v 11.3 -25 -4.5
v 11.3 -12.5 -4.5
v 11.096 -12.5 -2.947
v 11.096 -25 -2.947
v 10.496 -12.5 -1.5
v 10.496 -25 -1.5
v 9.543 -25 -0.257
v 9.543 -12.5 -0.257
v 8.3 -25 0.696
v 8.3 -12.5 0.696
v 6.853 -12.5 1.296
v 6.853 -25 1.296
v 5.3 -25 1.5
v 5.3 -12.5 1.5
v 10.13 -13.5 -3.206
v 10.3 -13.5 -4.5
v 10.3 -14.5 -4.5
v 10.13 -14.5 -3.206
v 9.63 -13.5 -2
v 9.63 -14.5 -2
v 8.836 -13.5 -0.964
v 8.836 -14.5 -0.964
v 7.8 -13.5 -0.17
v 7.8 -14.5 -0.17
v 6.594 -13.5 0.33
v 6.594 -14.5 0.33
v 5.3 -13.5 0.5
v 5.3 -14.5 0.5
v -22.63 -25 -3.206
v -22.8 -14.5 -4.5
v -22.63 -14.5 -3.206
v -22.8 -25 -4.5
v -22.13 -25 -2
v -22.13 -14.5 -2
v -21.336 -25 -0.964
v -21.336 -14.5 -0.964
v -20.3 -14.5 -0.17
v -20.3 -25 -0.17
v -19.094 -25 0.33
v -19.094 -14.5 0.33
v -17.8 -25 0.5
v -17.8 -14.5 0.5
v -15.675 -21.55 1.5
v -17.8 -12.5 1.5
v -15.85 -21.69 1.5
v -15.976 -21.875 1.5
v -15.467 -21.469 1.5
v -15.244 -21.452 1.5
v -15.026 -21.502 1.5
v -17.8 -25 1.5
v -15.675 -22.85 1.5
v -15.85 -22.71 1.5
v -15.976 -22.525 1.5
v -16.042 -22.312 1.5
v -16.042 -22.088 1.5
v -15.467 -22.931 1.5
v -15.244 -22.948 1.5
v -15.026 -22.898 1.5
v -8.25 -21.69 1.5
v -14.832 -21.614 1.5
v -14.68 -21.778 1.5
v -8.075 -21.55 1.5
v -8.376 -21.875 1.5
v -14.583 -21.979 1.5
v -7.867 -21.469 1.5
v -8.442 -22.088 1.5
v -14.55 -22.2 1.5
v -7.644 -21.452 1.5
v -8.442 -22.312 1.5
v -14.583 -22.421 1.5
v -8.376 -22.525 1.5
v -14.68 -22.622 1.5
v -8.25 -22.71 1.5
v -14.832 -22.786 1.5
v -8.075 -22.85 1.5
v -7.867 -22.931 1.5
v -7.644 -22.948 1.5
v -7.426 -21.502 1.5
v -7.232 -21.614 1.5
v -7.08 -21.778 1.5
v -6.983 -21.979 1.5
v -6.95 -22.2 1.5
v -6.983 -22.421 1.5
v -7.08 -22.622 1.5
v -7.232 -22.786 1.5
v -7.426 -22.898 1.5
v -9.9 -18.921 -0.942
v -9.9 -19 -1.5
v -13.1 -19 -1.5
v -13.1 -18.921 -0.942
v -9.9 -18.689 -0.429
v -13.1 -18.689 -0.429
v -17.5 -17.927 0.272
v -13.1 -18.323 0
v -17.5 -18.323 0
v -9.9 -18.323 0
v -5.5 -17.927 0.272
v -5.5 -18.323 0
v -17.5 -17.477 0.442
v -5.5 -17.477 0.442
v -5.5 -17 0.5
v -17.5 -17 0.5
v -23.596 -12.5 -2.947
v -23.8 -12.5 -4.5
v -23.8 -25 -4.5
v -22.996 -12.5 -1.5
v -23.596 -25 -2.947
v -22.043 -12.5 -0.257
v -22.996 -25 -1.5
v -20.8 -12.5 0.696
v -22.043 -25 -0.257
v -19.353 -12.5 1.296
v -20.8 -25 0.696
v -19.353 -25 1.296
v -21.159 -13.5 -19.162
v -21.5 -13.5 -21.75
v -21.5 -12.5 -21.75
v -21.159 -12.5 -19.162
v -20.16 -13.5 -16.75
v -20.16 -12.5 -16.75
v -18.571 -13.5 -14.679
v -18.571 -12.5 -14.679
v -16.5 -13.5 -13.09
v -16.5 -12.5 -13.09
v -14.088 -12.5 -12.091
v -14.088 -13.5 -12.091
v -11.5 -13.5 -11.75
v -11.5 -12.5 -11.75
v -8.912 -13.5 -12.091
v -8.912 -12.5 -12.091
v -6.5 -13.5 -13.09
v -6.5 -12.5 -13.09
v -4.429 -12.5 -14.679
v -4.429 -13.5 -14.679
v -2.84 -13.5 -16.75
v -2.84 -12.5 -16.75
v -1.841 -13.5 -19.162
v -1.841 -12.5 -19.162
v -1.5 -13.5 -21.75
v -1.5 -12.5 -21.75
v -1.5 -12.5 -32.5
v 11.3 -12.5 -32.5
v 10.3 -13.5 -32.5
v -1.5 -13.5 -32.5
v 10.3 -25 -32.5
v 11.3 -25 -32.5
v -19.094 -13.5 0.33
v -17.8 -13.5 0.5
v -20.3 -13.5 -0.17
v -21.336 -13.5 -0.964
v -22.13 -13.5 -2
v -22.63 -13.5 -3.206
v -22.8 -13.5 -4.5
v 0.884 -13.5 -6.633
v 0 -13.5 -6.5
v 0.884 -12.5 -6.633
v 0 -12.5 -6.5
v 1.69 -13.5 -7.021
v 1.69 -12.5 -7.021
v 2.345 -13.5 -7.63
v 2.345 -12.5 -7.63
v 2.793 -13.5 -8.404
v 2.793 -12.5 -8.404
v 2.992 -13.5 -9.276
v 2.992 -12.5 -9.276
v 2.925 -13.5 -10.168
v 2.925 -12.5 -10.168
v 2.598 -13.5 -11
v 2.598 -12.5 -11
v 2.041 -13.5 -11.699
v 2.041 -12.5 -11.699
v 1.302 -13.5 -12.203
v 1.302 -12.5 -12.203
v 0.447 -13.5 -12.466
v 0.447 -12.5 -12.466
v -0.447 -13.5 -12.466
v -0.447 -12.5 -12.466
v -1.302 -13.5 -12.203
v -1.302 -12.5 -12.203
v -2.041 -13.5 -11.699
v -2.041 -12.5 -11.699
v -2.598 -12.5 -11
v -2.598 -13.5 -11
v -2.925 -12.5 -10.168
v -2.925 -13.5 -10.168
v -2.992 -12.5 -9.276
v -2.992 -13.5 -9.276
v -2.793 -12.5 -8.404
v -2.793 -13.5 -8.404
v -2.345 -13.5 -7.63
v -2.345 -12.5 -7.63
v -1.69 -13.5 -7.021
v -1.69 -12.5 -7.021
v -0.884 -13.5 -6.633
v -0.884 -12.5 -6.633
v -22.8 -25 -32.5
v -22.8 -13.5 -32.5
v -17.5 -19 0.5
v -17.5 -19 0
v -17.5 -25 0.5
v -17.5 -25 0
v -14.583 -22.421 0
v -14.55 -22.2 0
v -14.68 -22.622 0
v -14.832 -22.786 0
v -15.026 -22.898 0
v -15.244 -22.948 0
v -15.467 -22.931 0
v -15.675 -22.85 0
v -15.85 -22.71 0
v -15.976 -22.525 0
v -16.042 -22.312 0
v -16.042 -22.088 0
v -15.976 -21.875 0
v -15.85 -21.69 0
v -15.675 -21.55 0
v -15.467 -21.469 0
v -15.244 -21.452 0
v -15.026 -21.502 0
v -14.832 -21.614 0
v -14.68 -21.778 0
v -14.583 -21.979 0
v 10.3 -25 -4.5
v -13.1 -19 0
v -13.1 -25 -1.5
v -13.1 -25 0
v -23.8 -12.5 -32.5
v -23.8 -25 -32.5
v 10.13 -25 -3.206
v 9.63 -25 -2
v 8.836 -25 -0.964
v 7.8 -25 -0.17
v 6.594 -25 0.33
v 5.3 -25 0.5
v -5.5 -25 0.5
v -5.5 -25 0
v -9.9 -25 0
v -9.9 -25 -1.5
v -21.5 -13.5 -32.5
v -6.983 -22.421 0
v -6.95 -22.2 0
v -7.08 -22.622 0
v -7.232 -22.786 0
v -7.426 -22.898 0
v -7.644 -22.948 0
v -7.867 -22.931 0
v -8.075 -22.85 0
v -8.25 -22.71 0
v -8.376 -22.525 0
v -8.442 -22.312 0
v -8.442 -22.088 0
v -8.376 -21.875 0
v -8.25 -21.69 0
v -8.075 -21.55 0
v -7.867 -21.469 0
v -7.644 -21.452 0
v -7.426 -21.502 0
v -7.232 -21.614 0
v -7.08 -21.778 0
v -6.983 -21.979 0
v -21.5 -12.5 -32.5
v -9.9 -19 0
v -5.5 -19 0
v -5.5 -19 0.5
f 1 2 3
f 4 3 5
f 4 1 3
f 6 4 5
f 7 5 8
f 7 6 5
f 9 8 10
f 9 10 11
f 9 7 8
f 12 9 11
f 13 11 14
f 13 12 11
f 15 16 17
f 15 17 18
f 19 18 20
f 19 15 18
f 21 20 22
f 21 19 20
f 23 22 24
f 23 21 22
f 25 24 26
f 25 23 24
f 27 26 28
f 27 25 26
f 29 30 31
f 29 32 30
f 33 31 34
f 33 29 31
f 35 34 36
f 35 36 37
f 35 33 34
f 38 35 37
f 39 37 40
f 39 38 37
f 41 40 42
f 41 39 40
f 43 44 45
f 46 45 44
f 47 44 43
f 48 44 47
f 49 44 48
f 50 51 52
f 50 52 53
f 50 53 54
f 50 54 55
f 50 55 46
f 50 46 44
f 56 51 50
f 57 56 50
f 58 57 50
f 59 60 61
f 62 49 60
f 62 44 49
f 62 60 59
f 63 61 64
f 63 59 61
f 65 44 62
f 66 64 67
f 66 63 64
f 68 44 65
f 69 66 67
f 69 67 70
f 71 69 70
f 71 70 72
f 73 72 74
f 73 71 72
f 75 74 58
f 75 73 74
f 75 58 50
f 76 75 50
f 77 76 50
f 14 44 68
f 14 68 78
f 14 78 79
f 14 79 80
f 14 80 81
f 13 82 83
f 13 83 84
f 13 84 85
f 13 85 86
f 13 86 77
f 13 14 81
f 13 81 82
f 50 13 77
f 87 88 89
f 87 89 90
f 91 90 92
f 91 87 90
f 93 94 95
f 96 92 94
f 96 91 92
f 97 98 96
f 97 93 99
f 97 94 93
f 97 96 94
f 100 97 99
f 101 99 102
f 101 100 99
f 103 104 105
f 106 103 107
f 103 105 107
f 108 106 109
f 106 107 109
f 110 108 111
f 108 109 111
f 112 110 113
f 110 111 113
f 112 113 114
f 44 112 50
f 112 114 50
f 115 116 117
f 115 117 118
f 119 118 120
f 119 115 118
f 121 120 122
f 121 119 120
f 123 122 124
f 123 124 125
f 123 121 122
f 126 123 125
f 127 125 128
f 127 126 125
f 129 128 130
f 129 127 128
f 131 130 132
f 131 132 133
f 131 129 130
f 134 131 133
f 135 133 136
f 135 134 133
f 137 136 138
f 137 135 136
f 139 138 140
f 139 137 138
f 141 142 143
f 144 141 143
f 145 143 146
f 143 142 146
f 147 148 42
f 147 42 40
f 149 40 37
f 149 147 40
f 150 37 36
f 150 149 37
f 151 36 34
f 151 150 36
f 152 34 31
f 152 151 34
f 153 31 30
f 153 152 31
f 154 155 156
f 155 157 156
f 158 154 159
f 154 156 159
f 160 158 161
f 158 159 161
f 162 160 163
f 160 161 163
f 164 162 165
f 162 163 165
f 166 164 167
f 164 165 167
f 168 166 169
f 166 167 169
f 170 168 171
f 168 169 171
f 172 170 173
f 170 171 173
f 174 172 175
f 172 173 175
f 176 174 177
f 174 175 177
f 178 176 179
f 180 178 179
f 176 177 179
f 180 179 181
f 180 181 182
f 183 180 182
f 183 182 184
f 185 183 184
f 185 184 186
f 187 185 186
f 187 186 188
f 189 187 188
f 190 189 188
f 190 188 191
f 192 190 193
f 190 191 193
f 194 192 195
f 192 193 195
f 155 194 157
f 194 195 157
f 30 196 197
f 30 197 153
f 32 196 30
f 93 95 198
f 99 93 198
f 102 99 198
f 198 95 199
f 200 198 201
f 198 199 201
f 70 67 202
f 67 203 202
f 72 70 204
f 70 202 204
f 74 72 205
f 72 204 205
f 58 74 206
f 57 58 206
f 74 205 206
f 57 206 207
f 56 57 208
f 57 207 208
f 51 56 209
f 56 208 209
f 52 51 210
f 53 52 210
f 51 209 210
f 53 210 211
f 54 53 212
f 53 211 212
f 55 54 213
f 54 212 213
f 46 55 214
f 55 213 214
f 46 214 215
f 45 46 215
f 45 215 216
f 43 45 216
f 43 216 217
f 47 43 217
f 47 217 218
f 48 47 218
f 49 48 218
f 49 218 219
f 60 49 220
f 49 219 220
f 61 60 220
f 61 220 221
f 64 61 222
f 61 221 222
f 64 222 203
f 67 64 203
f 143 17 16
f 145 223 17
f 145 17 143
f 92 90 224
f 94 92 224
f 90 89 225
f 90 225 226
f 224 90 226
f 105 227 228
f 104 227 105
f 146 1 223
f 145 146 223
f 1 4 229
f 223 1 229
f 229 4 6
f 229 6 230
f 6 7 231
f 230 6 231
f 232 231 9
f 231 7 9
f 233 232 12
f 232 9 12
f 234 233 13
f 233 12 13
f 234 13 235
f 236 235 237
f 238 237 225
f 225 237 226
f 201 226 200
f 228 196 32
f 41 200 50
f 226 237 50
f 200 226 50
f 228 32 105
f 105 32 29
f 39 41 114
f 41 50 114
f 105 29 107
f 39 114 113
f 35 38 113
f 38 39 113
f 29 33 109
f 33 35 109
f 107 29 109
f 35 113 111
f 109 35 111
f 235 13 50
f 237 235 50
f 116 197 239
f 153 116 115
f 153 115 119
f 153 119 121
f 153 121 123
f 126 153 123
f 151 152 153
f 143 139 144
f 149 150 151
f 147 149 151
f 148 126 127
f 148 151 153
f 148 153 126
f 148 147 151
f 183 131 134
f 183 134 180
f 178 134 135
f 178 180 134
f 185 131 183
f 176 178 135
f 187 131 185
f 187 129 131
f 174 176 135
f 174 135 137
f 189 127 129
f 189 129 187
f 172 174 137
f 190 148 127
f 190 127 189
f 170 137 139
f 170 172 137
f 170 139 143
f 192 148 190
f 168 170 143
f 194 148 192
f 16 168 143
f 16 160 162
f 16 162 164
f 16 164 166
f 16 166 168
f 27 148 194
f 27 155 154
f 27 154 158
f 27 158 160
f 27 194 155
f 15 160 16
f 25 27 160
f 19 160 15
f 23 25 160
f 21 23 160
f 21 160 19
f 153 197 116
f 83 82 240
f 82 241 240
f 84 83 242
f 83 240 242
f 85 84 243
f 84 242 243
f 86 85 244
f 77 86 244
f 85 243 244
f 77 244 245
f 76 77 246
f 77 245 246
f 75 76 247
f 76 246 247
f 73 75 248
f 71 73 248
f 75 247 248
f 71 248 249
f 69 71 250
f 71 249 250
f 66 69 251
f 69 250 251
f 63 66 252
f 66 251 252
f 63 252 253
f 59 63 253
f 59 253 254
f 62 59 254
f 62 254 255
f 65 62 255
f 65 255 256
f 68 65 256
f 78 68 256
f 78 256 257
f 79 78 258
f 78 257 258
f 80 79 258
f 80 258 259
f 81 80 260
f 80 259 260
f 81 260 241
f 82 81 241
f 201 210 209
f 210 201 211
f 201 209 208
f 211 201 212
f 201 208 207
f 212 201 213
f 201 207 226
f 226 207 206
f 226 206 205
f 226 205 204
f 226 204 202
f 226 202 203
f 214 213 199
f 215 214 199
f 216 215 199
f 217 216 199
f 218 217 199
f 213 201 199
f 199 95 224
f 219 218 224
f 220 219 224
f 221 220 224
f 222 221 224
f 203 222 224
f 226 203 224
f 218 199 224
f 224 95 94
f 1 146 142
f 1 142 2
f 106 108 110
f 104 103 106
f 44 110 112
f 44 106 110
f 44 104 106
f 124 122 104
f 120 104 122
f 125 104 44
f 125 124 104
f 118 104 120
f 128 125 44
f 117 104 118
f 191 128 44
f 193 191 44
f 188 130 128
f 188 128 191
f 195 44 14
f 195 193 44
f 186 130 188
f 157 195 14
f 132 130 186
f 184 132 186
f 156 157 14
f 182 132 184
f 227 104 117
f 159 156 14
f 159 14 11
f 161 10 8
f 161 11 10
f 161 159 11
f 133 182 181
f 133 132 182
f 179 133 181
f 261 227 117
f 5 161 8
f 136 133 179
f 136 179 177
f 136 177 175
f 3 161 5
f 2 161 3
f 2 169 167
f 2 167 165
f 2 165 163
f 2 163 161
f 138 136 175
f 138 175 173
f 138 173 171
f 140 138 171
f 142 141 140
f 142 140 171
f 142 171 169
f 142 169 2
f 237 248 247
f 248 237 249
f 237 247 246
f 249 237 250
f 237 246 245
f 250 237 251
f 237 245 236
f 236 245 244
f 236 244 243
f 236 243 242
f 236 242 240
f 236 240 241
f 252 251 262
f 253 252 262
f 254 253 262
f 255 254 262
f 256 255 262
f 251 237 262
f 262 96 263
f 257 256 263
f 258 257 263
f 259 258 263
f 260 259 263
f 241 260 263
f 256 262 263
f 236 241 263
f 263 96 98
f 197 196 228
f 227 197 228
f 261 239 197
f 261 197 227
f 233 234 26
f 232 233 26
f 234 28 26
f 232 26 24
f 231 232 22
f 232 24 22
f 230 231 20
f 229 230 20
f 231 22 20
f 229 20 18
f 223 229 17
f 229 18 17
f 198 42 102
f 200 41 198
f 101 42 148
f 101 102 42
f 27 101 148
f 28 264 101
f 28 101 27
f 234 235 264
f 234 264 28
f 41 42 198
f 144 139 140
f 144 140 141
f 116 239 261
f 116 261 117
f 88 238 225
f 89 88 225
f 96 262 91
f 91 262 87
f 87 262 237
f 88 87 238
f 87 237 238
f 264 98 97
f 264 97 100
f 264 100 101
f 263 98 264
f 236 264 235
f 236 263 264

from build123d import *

# Parameters (mm, degrees)
SKETCH1_W             = 4.399513203
SKETCH1_H             = 6
SKETCH1_R             = 0.75
BOSS_EXTRUDE1_DEPTH   = 1.5
BOSS_EXTRUDE1_2_DEPTH = 1.5
BOSS_EXTRUDE2_START   = -1
SKETCH2_W             = 34.1
SKETCH2_H             = 12.5
SKETCH2_R             = 0.75
BOSS_EXTRUDE2_DEPTH   = 1
BOSS_EXTRUDE3_DEPTH   = 1
SKETCH5_W             = 34
SKETCH5_H             = 12.5
BOSS_EXTRUDE4_DEPTH   = 1
SKETCH6_W             = 34
SKETCH6_H             = 12.5
BOSS_EXTRUDE5_DEPTH   = 1
SKETCH7_W             = 3.200973594
SKETCH7_H             = 6
BOSS_EXTRUDE6_DEPTH   = 2
FILLET1_R             = 2
FILLET2_R             = 5
FILLET3_R             = 6
FILLET4_R             = 5
FILLET5_R             = 6
SKETCH8_R             = 3
CUT_EXTRUDE1_DEPTH    = 2
FILLET1_OF_MIRROR1_R  = 2
FILLET2_OF_MIRROR1_R  = 5
FILLET3_OF_MIRROR1_R  = 6
FILLET4_OF_MIRROR1_R  = 5
FILLET5_OF_MIRROR1_R  = 6
CUT_EXTRUDE2_START    = -10.5
CUT_EXTRUDE2_DEPTH    = 10.5
CUT_EXTRUDE4_START    = -1
CUT_EXTRUDE4_DEPTH    = 1


with BuildPart() as part:
    # Sketch1 → Boss-Extrude1 (new body)
    with BuildSketch(Plane.XY):
        with Locations((-7.699756602, -5)):
            Rectangle(SKETCH1_W, SKETCH1_H)
        with Locations((-7.7, -4.8)):
            Circle(SKETCH1_R, mode=Mode.SUBTRACT)
    boss_extrude1 = extrude(amount=BOSS_EXTRUDE1_DEPTH)



with BuildPart() as body_2:
    # Sketch1 → Boss-Extrude1 2 (new body)
    with BuildSketch(Plane.XY):
        with Locations((-15.300243399, -5)):
            Rectangle(SKETCH1_W, SKETCH1_H)
        with Locations((-15.3, -4.8)):
            Circle(SKETCH1_R, mode=Mode.SUBTRACT)
    boss_extrude1_2 = extrude(amount=BOSS_EXTRUDE1_2_DEPTH)


with BuildPart() as part_1:
    add(part.part)

    add(body_2.part)  # Boss-Extrude2 merges body 2
    # Sketch2 → Boss-Extrude2 (add)
    with BuildSketch(Plane.XY.offset(1.5).offset(BOSS_EXTRUDE2_START)):
        with Locations((-5.75, -8.25)):
            Rectangle(SKETCH2_W, SKETCH2_H)
        with Locations((-7.7, -4.8)):
            Circle(SKETCH2_R, mode=Mode.SUBTRACT)
        with Locations((-15.3, -4.8)):
            Circle(SKETCH2_R, mode=Mode.SUBTRACT)
    boss_extrude2 = extrude(amount=BOSS_EXTRUDE2_DEPTH)

    # Sketch4 → Boss-Extrude3 (add)
    with BuildSketch(Plane.XZ.offset(14.5)):
        with BuildLine():
            Line((-22.8, 0.5), (-22.8, -32.5))
            Line((-22.8, -32.5), (-21.5, -32.5))
            Line((-21.5, -32.5), (-21.5, -21.75))
            ThreePointArc((-21.5, -21.75), (-11.5, -11.75), (-1.5, -21.75))
            Line((-1.5, -21.75), (-1.5, -32.5))
            Line((-1.5, -32.5), (11.3, -32.5))
            Line((11.3, -32.5), (11.3, 0.5))
            Line((11.3, 0.5), (-22.8, 0.5))
        make_face()
    boss_extrude3 = extrude(amount=-BOSS_EXTRUDE3_DEPTH)

    # Sketch5 → Boss-Extrude4 (add)
    with BuildSketch(Plane.ZY.offset(22.8)):
        with Locations((-15.5, -8.25)):
            Rectangle(SKETCH5_W, SKETCH5_H)
    boss_extrude4 = extrude(amount=BOSS_EXTRUDE4_DEPTH)

    # Sketch6 → Boss-Extrude5 (add)
    with BuildSketch(Plane(origin=(11.3, 0, 0), x_dir=(0, 0, -1), z_dir=(1, 0, 0))):
        with Locations((15.5, -8.25)):
            Rectangle(SKETCH6_W, SKETCH6_H)
    boss_extrude5 = extrude(amount=-BOSS_EXTRUDE5_DEPTH)

    # Sketch7 → Boss-Extrude6 (add)
    with BuildSketch(Plane(origin=(0, 0, 0.5), x_dir=(-1, 0, 0), z_dir=(0, 0, -1))):
        with Locations((11.5, -5)):
            Rectangle(SKETCH7_W, SKETCH7_H)
    boss_extrude6 = extrude(amount=BOSS_EXTRUDE6_DEPTH)

    # Fillet1
    # the kernel refuses this fillet: 2 mm, written as the material it adds along each edge
    with BuildSketch(Plane(origin=(-17.5, -8, 0.5), x_dir=(0, 0, -1), z_dir=(1, 0, 0))) as fillet1_piece_1_section:
        with BuildLine():
            CenterArc((FILLET1_R, -FILLET1_R), FILLET1_R, 90, 90)
            Line((0, -FILLET1_R), (0, 0))
            Line((0, 0), (FILLET1_R, 0))
        make_face()
    fillet1_piece_1 = extrude(amount=12, mode=Mode.PRIVATE)
    fillet1_piece_1 = split(fillet1_piece_1, bisect_by=Plane(origin=(-15.300243398, -8.620266002, 0), z_dir=(0, 0, 1)), keep=Keep.TOP, mode=Mode.PRIVATE)
    fillet1_piece_1 = split(fillet1_piece_1, bisect_by=Plane(origin=(-13.100486797, -8.620266002, 0.317331321), z_dir=(-1, 0, 0)), keep=Keep.TOP, mode=Mode.PRIVATE)
    add(fillet1_piece_1)
    with BuildSketch(Plane(origin=(-17.5, -8, 0.5), x_dir=(0, 0, -1), z_dir=(1, 0, 0))) as fillet1_piece_2_section:
        with BuildLine():
            CenterArc((FILLET1_R, -FILLET1_R), FILLET1_R, 90, 90)
            Line((0, -FILLET1_R), (0, 0))
            Line((0, 0), (FILLET1_R, 0))
        make_face()
    fillet1_piece_2 = extrude(amount=12, mode=Mode.PRIVATE)
    fillet1_piece_2 = split(fillet1_piece_2, bisect_by=Plane(origin=(-9.899513203, -8.160707913, -0.423889575), z_dir=(-1, 0, 0)), keep=Keep.TOP, mode=Mode.PRIVATE)
    fillet1_piece_2 = split(fillet1_piece_2, bisect_by=Plane(origin=(-11.5, -8.160707913, 0), z_dir=(0, 0, -1)), keep=Keep.TOP, mode=Mode.PRIVATE)
    fillet1_piece_2 = split(fillet1_piece_2, bisect_by=Plane(origin=(-13.100486797, -8.160707913, -0.423889575), z_dir=(1, 0, 0)), keep=Keep.TOP, mode=Mode.PRIVATE)
    add(fillet1_piece_2)
    with BuildSketch(Plane(origin=(-17.5, -8, 0.5), x_dir=(0, 0, -1), z_dir=(1, 0, 0))) as fillet1_piece_3_section:
        with BuildLine():
            CenterArc((FILLET1_R, -FILLET1_R), FILLET1_R, 90, 90)
            Line((0, -FILLET1_R), (0, 0))
            Line((0, 0), (FILLET1_R, 0))
        make_face()
    fillet1_piece_3 = extrude(amount=12, mode=Mode.PRIVATE)
    fillet1_piece_3 = split(fillet1_piece_3, bisect_by=Plane(origin=(-9.899513203, -8.620266002, 0.317331321), z_dir=(-1, 0, 0)), keep=Keep.TOP, mode=Mode.PRIVATE)
    fillet1_piece_3 = split(fillet1_piece_3, bisect_by=Plane(origin=(-11.5, -8.620266002, 0), z_dir=(0, 0, 1)), keep=Keep.TOP, mode=Mode.PRIVATE)
    fillet1_piece_3 = split(fillet1_piece_3, bisect_by=Plane(origin=(-13.100486797, -8.620266002, 0.317331321), z_dir=(1, 0, 0)), keep=Keep.TOP, mode=Mode.PRIVATE)
    add(fillet1_piece_3)
    with BuildSketch(Plane(origin=(-17.5, -8, 0.5), x_dir=(0, 0, -1), z_dir=(1, 0, 0))) as fillet1_piece_4_section:
        with BuildLine():
            CenterArc((FILLET1_R, -FILLET1_R), FILLET1_R, 90, 90)
            Line((0, -FILLET1_R), (0, 0))
            Line((0, 0), (FILLET1_R, 0))
        make_face()
    fillet1_piece_4 = extrude(amount=12, mode=Mode.PRIVATE)
    fillet1_piece_4 = split(fillet1_piece_4, bisect_by=Plane(origin=(-9.899513203, -8.620266002, 0.317331321), z_dir=(1, 0, 0)), keep=Keep.TOP, mode=Mode.PRIVATE)
    fillet1_piece_4 = split(fillet1_piece_4, bisect_by=Plane(origin=(-7.699756602, -8.620266002, 0), z_dir=(0, 0, 1)), keep=Keep.TOP, mode=Mode.PRIVATE)
    add(fillet1_piece_4)

    # Fillet2
    fillet2_edges = [part_1.edges().sort_by_distance(p)[0] for p in [
        (-22.8, -7.75, 0.5),
    ]]
    fillet(fillet2_edges, radius=FILLET2_R)

    # Fillet3
    fillet3_edges = [part_1.edges().sort_by_distance(p)[0] for p in [
        (-23.8, -8.25, 1.5),
    ]]
    fillet(fillet3_edges, radius=FILLET3_R)

    # Fillet4
    fillet4_edges = [part_1.edges().sort_by_distance(p)[0] for p in [
        (10.3, -7.75, 0.5),
    ]]
    fillet(fillet4_edges, radius=FILLET4_R)

    # Fillet5
    fillet5_edges = [part_1.edges().sort_by_distance(p)[0] for p in [
        (11.3, -8.25, 1.5),
    ]]
    fillet(fillet5_edges, radius=FILLET5_R)

    # Sketch8 → Cut-Extrude1 (cut)
    with BuildSketch(Plane(origin=(0, -13.5, 0), x_dir=(1, 0, 0), z_dir=(0, 1, 0))):
        with Locations(Location((0, 9.5, 0), (0, 0, 270))):
            Circle(SKETCH8_R)
    cut_extrude1 = extrude(amount=-CUT_EXTRUDE1_DEPTH, mode=Mode.SUBTRACT)

    # Mirror1: Boss-Extrude1, Boss-Extrude1 2, Boss-Extrude2, Boss-Extrude3, Boss-Extrude4, Boss-Extrude5, Boss-Extrude6, Cut-Extrude1 across plane
    add(boss_extrude1.mirror(Plane(origin=(-11.5, -13.5, -21.75), x_dir=(0, 0, 1), z_dir=(0, -1, 0))))
    add(boss_extrude1_2.mirror(Plane(origin=(-11.5, -13.5, -21.75), x_dir=(0, 0, 1), z_dir=(0, -1, 0))))
    add(boss_extrude2.mirror(Plane(origin=(-11.5, -13.5, -21.75), x_dir=(0, 0, 1), z_dir=(0, -1, 0))))
    add(boss_extrude3.mirror(Plane(origin=(-11.5, -13.5, -21.75), x_dir=(0, 0, 1), z_dir=(0, -1, 0))))
    add(boss_extrude4.mirror(Plane(origin=(-11.5, -13.5, -21.75), x_dir=(0, 0, 1), z_dir=(0, -1, 0))))
    add(boss_extrude5.mirror(Plane(origin=(-11.5, -13.5, -21.75), x_dir=(0, 0, 1), z_dir=(0, -1, 0))))
    add(boss_extrude6.mirror(Plane(origin=(-11.5, -13.5, -21.75), x_dir=(0, 0, 1), z_dir=(0, -1, 0))))
    add(cut_extrude1.mirror(Plane(origin=(-11.5, -13.5, -21.75), x_dir=(0, 0, 1), z_dir=(0, -1, 0))), mode=Mode.SUBTRACT)

    # Fillet1 of Mirror1
    # the kernel refuses this fillet: 2 mm, written as the material it adds along each edge
    with BuildSketch(Plane(origin=(-5.5, -19, 0.5), x_dir=(0, 1, 0), z_dir=(-1, 0, 0))) as fillet1_of_mirror1_piece_1_section:
        with BuildLine():
            CenterArc((FILLET1_OF_MIRROR1_R, FILLET1_OF_MIRROR1_R), FILLET1_OF_MIRROR1_R, 180, 90)
            Line((0, FILLET1_OF_MIRROR1_R), (0, 0))
            Line((0, 0), (FILLET1_OF_MIRROR1_R, 0))
        make_face()
    fillet1_of_mirror1_piece_1 = extrude(amount=12, mode=Mode.PRIVATE)
    fillet1_of_mirror1_piece_1 = split(fillet1_of_mirror1_piece_1, bisect_by=Plane(origin=(-7.699756602, -18.379733998, 0), z_dir=(0, 0, 1)), keep=Keep.TOP, mode=Mode.PRIVATE)
    fillet1_of_mirror1_piece_1 = split(fillet1_of_mirror1_piece_1, bisect_by=Plane(origin=(-9.899513203, -18.379733998, 0.317331321), z_dir=(1, 0, 0)), keep=Keep.TOP, mode=Mode.PRIVATE)
    add(fillet1_of_mirror1_piece_1)
    with BuildSketch(Plane(origin=(-5.5, -19, 0.5), x_dir=(0, 1, 0), z_dir=(-1, 0, 0))) as fillet1_of_mirror1_piece_2_section:
        with BuildLine():
            CenterArc((FILLET1_OF_MIRROR1_R, FILLET1_OF_MIRROR1_R), FILLET1_OF_MIRROR1_R, 180, 90)
            Line((0, FILLET1_OF_MIRROR1_R), (0, 0))
            Line((0, 0), (FILLET1_OF_MIRROR1_R, 0))
        make_face()
    fillet1_of_mirror1_piece_2 = extrude(amount=12, mode=Mode.PRIVATE)
    fillet1_of_mirror1_piece_2 = split(fillet1_of_mirror1_piece_2, bisect_by=Plane(origin=(-11.5, -18.379733998, 0), z_dir=(0, 0, 1)), keep=Keep.TOP, mode=Mode.PRIVATE)
    fillet1_of_mirror1_piece_2 = split(fillet1_of_mirror1_piece_2, bisect_by=Plane(origin=(-13.100486797, -18.379733998, 0.317331321), z_dir=(1, 0, 0)), keep=Keep.TOP, mode=Mode.PRIVATE)
    fillet1_of_mirror1_piece_2 = split(fillet1_of_mirror1_piece_2, bisect_by=Plane(origin=(-9.899513203, -18.379733998, 0.317331321), z_dir=(-1, 0, 0)), keep=Keep.TOP, mode=Mode.PRIVATE)
    add(fillet1_of_mirror1_piece_2)
    with BuildSketch(Plane(origin=(-5.5, -19, 0.5), x_dir=(0, 1, 0), z_dir=(-1, 0, 0))) as fillet1_of_mirror1_piece_3_section:
        with BuildLine():
            CenterArc((FILLET1_OF_MIRROR1_R, FILLET1_OF_MIRROR1_R), FILLET1_OF_MIRROR1_R, 180, 90)
            Line((0, FILLET1_OF_MIRROR1_R), (0, 0))
            Line((0, 0), (FILLET1_OF_MIRROR1_R, 0))
        make_face()
    fillet1_of_mirror1_piece_3 = extrude(amount=12, mode=Mode.PRIVATE)
    fillet1_of_mirror1_piece_3 = split(fillet1_of_mirror1_piece_3, bisect_by=Plane(origin=(-11.5, -18.839292087, 0), z_dir=(0, 0, -1)), keep=Keep.TOP, mode=Mode.PRIVATE)
    fillet1_of_mirror1_piece_3 = split(fillet1_of_mirror1_piece_3, bisect_by=Plane(origin=(-13.100486797, -18.839292087, -0.423889575), z_dir=(1, 0, 0)), keep=Keep.TOP, mode=Mode.PRIVATE)
    fillet1_of_mirror1_piece_3 = split(fillet1_of_mirror1_piece_3, bisect_by=Plane(origin=(-9.899513203, -18.839292087, -0.423889575), z_dir=(-1, 0, 0)), keep=Keep.TOP, mode=Mode.PRIVATE)
    add(fillet1_of_mirror1_piece_3)
    with BuildSketch(Plane(origin=(-5.5, -19, 0.5), x_dir=(0, 1, 0), z_dir=(-1, 0, 0))) as fillet1_of_mirror1_piece_4_section:
        with BuildLine():
            CenterArc((FILLET1_OF_MIRROR1_R, FILLET1_OF_MIRROR1_R), FILLET1_OF_MIRROR1_R, 180, 90)
            Line((0, FILLET1_OF_MIRROR1_R), (0, 0))
            Line((0, 0), (FILLET1_OF_MIRROR1_R, 0))
        make_face()
    fillet1_of_mirror1_piece_4 = extrude(amount=12, mode=Mode.PRIVATE)
    fillet1_of_mirror1_piece_4 = split(fillet1_of_mirror1_piece_4, bisect_by=Plane(origin=(-15.300243398, -18.379733998, 0), z_dir=(0, 0, 1)), keep=Keep.TOP, mode=Mode.PRIVATE)
    fillet1_of_mirror1_piece_4 = split(fillet1_of_mirror1_piece_4, bisect_by=Plane(origin=(-13.100486797, -18.379733998, 0.317331321), z_dir=(-1, 0, 0)), keep=Keep.TOP, mode=Mode.PRIVATE)
    add(fillet1_of_mirror1_piece_4)

    # Fillet2 of Mirror1
    fillet2_of_mirror1_edges = [part_1.edges().sort_by_distance(p)[0] for p in [
        (-22.8, -19.25, 0.5),
    ]]
    fillet(fillet2_of_mirror1_edges, radius=FILLET2_OF_MIRROR1_R)

    # Fillet3 of Mirror1
    fillet3_of_mirror1_edges = [part_1.edges().sort_by_distance(p)[0] for p in [
        (-23.8, -18.75, 1.5),
    ]]
    fillet(fillet3_of_mirror1_edges, radius=FILLET3_OF_MIRROR1_R)

    # Fillet4 of Mirror1
    fillet4_of_mirror1_edges = [part_1.edges().sort_by_distance(p)[0] for p in [
        (10.3, -19.25, 0.5),
    ]]
    fillet(fillet4_of_mirror1_edges, radius=FILLET4_OF_MIRROR1_R)

    # Fillet5 of Mirror1
    fillet5_of_mirror1_edges = [part_1.edges().sort_by_distance(p)[0] for p in [
        (11.3, -18.75, 1.5),
    ]]
    fillet(fillet5_of_mirror1_edges, radius=FILLET5_OF_MIRROR1_R)

    # Sketch9 → Cut-Extrude2 (cut)
    with BuildSketch(Plane(origin=(0, -2, 0), x_dir=(1, 0, 0), z_dir=(0, 1, 0)).offset(CUT_EXTRUDE2_START)):
        with BuildLine():
            Line((-17.8, -1.5), (5.3, -1.5))
            ThreePointArc((5.3, -1.5), (9.542640687, 0.257359313), (11.3, 4.5))
            Line((11.3, 4.5), (11.3, 32.5))
            Line((11.3, 32.5), (10.3, 32.5))
            Line((10.3, 32.5), (10.3, 4.5))
            ThreePointArc((10.3, 4.5), (8.835533906, 0.964466094), (5.3, -0.5))
            Line((5.3, -0.5), (-5.5, -0.5))
            Line((-5.5, -0.5), (-5.5, 0))
            Line((-5.5, 0), (-9.899513203, 0))
            Line((-9.899513203, 0), (-9.899513203, 1.5))
            Line((-9.899513203, 1.5), (-13.100486797, 1.5))
            Line((-13.100486797, 1.5), (-13.100486797, 0))
            Line((-13.100486797, 0), (-17.5, 0))
            Line((-17.5, 0), (-17.5, -0.5))
            Line((-17.5, -0.5), (-17.8, -0.5))
            ThreePointArc((-17.8, -0.5), (-21.335533906, 0.964466094), (-22.8, 4.5))
            Line((-22.8, 4.5), (-22.8, 32.5))
            Line((-22.8, 32.5), (-23.8, 32.5))
            Line((-23.8, 32.5), (-23.8, 4.5))
            ThreePointArc((-23.8, 4.5), (-22.042640687, 0.257359313), (-17.8, -1.5))
        make_face()
    extrude(amount=CUT_EXTRUDE2_DEPTH, mode=Mode.SUBTRACT)

    # Sketch12 → Cut-Extrude4 (cut)
    with BuildSketch(Plane.XZ.offset(14.5).offset(CUT_EXTRUDE4_START)):
        with BuildLine():
            Line((-22.8, -4.5), (-22.8, -32.5))
            Line((-22.8, -32.5), (-21.5, -32.5))
            Line((-21.5, -32.5), (-21.5, -21.75))
            ThreePointArc((-21.5, -21.75), (-11.5, -11.75), (-1.5, -21.75))
            Line((-1.5, -21.75), (-1.5, -32.5))
            Line((-1.5, -32.5), (10.3, -32.5))
            Line((10.3, -32.5), (10.3, -4.5))
            ThreePointArc((10.3, -4.5), (8.835533906, -0.964466094), (5.3, 0.5))
            Line((5.3, 0.5), (-17.8, 0.5))
            ThreePointArc((-17.8, 0.5), (-21.335533906, -0.964466094), (-22.8, -4.5))
        make_face()
    extrude(amount=CUT_EXTRUDE4_DEPTH, mode=Mode.SUBTRACT)


solid = part_1.part
